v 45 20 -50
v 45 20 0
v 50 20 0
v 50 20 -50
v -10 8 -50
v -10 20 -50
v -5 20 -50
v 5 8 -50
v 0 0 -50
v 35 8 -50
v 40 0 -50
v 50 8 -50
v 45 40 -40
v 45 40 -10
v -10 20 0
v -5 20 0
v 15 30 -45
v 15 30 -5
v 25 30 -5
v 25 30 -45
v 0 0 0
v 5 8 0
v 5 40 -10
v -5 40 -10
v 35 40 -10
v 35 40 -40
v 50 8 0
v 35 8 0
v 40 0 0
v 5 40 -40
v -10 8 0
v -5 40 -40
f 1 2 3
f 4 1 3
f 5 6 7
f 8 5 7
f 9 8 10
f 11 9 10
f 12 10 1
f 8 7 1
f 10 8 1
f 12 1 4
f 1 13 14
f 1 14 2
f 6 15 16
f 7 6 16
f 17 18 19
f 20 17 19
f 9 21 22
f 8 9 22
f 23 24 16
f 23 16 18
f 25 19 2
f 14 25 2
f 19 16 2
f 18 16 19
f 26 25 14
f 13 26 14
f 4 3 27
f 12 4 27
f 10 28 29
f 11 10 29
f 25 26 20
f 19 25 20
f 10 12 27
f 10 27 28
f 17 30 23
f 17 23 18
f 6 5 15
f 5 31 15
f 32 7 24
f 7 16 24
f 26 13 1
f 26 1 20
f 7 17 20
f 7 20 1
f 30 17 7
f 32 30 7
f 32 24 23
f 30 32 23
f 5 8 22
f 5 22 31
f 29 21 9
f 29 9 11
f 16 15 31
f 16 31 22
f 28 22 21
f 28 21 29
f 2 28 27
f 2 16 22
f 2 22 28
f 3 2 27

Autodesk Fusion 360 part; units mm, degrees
sketch "Sketch1" plane through (0, 0, 0) normal (0, 0, 1) x (1, 0, 0)
  line L0 (0, 0) -> (40, 0)
  line L1 (0, 0) -> (5, 8)
  line L2 (35, 8) -> (40, 0)
  line L3 (5, 8) -> (-10, 8)
  line L4 (-10, 8) -> (-10, 20)
  line L5 (-10, 20) -> (50, 20)
  line L6 (50, 20) -> (50, 8)
  line L7 (50, 8) -> (35, 8)
  line L8 (-5, 20) -> (-5, 40)
  line L9 (-5, 40) -> (5, 40)
  line L10 (15, 30) -> (25, 30)
  line L11 (35, 40) -> (45, 40)
  line L12 (45, 40) -> (45, 20)
  line L13 (5, 40) -> (15, 30)
  line L14 (35, 40) -> (25, 30)
  dimension "d1" = 40
  dimension "d2" = 30
  dimension "d5" = 12
  dimension "d8" = 60
  dimension "d9" = 5
  dimension "d10" = 5
  dimension "d11" = 10
  dimension "d14" = 10
  dimension "d15" = 10
  dimension "d16" = 20
  dimension "d17" = 8
extrude "Extrude1" add sketch "Sketch1" against normal blind 50
chamfer "Chamfer1" distance 10 distance2 20 1 edges at (0, 40, 0) measured on face at (-1.6667, 40, -16.6667)
chamfer "Chamfer2" distance 20 distance2 10 1 edges at (40, 40, -50) measured on face at (18.3333, 15.3333, -50)
